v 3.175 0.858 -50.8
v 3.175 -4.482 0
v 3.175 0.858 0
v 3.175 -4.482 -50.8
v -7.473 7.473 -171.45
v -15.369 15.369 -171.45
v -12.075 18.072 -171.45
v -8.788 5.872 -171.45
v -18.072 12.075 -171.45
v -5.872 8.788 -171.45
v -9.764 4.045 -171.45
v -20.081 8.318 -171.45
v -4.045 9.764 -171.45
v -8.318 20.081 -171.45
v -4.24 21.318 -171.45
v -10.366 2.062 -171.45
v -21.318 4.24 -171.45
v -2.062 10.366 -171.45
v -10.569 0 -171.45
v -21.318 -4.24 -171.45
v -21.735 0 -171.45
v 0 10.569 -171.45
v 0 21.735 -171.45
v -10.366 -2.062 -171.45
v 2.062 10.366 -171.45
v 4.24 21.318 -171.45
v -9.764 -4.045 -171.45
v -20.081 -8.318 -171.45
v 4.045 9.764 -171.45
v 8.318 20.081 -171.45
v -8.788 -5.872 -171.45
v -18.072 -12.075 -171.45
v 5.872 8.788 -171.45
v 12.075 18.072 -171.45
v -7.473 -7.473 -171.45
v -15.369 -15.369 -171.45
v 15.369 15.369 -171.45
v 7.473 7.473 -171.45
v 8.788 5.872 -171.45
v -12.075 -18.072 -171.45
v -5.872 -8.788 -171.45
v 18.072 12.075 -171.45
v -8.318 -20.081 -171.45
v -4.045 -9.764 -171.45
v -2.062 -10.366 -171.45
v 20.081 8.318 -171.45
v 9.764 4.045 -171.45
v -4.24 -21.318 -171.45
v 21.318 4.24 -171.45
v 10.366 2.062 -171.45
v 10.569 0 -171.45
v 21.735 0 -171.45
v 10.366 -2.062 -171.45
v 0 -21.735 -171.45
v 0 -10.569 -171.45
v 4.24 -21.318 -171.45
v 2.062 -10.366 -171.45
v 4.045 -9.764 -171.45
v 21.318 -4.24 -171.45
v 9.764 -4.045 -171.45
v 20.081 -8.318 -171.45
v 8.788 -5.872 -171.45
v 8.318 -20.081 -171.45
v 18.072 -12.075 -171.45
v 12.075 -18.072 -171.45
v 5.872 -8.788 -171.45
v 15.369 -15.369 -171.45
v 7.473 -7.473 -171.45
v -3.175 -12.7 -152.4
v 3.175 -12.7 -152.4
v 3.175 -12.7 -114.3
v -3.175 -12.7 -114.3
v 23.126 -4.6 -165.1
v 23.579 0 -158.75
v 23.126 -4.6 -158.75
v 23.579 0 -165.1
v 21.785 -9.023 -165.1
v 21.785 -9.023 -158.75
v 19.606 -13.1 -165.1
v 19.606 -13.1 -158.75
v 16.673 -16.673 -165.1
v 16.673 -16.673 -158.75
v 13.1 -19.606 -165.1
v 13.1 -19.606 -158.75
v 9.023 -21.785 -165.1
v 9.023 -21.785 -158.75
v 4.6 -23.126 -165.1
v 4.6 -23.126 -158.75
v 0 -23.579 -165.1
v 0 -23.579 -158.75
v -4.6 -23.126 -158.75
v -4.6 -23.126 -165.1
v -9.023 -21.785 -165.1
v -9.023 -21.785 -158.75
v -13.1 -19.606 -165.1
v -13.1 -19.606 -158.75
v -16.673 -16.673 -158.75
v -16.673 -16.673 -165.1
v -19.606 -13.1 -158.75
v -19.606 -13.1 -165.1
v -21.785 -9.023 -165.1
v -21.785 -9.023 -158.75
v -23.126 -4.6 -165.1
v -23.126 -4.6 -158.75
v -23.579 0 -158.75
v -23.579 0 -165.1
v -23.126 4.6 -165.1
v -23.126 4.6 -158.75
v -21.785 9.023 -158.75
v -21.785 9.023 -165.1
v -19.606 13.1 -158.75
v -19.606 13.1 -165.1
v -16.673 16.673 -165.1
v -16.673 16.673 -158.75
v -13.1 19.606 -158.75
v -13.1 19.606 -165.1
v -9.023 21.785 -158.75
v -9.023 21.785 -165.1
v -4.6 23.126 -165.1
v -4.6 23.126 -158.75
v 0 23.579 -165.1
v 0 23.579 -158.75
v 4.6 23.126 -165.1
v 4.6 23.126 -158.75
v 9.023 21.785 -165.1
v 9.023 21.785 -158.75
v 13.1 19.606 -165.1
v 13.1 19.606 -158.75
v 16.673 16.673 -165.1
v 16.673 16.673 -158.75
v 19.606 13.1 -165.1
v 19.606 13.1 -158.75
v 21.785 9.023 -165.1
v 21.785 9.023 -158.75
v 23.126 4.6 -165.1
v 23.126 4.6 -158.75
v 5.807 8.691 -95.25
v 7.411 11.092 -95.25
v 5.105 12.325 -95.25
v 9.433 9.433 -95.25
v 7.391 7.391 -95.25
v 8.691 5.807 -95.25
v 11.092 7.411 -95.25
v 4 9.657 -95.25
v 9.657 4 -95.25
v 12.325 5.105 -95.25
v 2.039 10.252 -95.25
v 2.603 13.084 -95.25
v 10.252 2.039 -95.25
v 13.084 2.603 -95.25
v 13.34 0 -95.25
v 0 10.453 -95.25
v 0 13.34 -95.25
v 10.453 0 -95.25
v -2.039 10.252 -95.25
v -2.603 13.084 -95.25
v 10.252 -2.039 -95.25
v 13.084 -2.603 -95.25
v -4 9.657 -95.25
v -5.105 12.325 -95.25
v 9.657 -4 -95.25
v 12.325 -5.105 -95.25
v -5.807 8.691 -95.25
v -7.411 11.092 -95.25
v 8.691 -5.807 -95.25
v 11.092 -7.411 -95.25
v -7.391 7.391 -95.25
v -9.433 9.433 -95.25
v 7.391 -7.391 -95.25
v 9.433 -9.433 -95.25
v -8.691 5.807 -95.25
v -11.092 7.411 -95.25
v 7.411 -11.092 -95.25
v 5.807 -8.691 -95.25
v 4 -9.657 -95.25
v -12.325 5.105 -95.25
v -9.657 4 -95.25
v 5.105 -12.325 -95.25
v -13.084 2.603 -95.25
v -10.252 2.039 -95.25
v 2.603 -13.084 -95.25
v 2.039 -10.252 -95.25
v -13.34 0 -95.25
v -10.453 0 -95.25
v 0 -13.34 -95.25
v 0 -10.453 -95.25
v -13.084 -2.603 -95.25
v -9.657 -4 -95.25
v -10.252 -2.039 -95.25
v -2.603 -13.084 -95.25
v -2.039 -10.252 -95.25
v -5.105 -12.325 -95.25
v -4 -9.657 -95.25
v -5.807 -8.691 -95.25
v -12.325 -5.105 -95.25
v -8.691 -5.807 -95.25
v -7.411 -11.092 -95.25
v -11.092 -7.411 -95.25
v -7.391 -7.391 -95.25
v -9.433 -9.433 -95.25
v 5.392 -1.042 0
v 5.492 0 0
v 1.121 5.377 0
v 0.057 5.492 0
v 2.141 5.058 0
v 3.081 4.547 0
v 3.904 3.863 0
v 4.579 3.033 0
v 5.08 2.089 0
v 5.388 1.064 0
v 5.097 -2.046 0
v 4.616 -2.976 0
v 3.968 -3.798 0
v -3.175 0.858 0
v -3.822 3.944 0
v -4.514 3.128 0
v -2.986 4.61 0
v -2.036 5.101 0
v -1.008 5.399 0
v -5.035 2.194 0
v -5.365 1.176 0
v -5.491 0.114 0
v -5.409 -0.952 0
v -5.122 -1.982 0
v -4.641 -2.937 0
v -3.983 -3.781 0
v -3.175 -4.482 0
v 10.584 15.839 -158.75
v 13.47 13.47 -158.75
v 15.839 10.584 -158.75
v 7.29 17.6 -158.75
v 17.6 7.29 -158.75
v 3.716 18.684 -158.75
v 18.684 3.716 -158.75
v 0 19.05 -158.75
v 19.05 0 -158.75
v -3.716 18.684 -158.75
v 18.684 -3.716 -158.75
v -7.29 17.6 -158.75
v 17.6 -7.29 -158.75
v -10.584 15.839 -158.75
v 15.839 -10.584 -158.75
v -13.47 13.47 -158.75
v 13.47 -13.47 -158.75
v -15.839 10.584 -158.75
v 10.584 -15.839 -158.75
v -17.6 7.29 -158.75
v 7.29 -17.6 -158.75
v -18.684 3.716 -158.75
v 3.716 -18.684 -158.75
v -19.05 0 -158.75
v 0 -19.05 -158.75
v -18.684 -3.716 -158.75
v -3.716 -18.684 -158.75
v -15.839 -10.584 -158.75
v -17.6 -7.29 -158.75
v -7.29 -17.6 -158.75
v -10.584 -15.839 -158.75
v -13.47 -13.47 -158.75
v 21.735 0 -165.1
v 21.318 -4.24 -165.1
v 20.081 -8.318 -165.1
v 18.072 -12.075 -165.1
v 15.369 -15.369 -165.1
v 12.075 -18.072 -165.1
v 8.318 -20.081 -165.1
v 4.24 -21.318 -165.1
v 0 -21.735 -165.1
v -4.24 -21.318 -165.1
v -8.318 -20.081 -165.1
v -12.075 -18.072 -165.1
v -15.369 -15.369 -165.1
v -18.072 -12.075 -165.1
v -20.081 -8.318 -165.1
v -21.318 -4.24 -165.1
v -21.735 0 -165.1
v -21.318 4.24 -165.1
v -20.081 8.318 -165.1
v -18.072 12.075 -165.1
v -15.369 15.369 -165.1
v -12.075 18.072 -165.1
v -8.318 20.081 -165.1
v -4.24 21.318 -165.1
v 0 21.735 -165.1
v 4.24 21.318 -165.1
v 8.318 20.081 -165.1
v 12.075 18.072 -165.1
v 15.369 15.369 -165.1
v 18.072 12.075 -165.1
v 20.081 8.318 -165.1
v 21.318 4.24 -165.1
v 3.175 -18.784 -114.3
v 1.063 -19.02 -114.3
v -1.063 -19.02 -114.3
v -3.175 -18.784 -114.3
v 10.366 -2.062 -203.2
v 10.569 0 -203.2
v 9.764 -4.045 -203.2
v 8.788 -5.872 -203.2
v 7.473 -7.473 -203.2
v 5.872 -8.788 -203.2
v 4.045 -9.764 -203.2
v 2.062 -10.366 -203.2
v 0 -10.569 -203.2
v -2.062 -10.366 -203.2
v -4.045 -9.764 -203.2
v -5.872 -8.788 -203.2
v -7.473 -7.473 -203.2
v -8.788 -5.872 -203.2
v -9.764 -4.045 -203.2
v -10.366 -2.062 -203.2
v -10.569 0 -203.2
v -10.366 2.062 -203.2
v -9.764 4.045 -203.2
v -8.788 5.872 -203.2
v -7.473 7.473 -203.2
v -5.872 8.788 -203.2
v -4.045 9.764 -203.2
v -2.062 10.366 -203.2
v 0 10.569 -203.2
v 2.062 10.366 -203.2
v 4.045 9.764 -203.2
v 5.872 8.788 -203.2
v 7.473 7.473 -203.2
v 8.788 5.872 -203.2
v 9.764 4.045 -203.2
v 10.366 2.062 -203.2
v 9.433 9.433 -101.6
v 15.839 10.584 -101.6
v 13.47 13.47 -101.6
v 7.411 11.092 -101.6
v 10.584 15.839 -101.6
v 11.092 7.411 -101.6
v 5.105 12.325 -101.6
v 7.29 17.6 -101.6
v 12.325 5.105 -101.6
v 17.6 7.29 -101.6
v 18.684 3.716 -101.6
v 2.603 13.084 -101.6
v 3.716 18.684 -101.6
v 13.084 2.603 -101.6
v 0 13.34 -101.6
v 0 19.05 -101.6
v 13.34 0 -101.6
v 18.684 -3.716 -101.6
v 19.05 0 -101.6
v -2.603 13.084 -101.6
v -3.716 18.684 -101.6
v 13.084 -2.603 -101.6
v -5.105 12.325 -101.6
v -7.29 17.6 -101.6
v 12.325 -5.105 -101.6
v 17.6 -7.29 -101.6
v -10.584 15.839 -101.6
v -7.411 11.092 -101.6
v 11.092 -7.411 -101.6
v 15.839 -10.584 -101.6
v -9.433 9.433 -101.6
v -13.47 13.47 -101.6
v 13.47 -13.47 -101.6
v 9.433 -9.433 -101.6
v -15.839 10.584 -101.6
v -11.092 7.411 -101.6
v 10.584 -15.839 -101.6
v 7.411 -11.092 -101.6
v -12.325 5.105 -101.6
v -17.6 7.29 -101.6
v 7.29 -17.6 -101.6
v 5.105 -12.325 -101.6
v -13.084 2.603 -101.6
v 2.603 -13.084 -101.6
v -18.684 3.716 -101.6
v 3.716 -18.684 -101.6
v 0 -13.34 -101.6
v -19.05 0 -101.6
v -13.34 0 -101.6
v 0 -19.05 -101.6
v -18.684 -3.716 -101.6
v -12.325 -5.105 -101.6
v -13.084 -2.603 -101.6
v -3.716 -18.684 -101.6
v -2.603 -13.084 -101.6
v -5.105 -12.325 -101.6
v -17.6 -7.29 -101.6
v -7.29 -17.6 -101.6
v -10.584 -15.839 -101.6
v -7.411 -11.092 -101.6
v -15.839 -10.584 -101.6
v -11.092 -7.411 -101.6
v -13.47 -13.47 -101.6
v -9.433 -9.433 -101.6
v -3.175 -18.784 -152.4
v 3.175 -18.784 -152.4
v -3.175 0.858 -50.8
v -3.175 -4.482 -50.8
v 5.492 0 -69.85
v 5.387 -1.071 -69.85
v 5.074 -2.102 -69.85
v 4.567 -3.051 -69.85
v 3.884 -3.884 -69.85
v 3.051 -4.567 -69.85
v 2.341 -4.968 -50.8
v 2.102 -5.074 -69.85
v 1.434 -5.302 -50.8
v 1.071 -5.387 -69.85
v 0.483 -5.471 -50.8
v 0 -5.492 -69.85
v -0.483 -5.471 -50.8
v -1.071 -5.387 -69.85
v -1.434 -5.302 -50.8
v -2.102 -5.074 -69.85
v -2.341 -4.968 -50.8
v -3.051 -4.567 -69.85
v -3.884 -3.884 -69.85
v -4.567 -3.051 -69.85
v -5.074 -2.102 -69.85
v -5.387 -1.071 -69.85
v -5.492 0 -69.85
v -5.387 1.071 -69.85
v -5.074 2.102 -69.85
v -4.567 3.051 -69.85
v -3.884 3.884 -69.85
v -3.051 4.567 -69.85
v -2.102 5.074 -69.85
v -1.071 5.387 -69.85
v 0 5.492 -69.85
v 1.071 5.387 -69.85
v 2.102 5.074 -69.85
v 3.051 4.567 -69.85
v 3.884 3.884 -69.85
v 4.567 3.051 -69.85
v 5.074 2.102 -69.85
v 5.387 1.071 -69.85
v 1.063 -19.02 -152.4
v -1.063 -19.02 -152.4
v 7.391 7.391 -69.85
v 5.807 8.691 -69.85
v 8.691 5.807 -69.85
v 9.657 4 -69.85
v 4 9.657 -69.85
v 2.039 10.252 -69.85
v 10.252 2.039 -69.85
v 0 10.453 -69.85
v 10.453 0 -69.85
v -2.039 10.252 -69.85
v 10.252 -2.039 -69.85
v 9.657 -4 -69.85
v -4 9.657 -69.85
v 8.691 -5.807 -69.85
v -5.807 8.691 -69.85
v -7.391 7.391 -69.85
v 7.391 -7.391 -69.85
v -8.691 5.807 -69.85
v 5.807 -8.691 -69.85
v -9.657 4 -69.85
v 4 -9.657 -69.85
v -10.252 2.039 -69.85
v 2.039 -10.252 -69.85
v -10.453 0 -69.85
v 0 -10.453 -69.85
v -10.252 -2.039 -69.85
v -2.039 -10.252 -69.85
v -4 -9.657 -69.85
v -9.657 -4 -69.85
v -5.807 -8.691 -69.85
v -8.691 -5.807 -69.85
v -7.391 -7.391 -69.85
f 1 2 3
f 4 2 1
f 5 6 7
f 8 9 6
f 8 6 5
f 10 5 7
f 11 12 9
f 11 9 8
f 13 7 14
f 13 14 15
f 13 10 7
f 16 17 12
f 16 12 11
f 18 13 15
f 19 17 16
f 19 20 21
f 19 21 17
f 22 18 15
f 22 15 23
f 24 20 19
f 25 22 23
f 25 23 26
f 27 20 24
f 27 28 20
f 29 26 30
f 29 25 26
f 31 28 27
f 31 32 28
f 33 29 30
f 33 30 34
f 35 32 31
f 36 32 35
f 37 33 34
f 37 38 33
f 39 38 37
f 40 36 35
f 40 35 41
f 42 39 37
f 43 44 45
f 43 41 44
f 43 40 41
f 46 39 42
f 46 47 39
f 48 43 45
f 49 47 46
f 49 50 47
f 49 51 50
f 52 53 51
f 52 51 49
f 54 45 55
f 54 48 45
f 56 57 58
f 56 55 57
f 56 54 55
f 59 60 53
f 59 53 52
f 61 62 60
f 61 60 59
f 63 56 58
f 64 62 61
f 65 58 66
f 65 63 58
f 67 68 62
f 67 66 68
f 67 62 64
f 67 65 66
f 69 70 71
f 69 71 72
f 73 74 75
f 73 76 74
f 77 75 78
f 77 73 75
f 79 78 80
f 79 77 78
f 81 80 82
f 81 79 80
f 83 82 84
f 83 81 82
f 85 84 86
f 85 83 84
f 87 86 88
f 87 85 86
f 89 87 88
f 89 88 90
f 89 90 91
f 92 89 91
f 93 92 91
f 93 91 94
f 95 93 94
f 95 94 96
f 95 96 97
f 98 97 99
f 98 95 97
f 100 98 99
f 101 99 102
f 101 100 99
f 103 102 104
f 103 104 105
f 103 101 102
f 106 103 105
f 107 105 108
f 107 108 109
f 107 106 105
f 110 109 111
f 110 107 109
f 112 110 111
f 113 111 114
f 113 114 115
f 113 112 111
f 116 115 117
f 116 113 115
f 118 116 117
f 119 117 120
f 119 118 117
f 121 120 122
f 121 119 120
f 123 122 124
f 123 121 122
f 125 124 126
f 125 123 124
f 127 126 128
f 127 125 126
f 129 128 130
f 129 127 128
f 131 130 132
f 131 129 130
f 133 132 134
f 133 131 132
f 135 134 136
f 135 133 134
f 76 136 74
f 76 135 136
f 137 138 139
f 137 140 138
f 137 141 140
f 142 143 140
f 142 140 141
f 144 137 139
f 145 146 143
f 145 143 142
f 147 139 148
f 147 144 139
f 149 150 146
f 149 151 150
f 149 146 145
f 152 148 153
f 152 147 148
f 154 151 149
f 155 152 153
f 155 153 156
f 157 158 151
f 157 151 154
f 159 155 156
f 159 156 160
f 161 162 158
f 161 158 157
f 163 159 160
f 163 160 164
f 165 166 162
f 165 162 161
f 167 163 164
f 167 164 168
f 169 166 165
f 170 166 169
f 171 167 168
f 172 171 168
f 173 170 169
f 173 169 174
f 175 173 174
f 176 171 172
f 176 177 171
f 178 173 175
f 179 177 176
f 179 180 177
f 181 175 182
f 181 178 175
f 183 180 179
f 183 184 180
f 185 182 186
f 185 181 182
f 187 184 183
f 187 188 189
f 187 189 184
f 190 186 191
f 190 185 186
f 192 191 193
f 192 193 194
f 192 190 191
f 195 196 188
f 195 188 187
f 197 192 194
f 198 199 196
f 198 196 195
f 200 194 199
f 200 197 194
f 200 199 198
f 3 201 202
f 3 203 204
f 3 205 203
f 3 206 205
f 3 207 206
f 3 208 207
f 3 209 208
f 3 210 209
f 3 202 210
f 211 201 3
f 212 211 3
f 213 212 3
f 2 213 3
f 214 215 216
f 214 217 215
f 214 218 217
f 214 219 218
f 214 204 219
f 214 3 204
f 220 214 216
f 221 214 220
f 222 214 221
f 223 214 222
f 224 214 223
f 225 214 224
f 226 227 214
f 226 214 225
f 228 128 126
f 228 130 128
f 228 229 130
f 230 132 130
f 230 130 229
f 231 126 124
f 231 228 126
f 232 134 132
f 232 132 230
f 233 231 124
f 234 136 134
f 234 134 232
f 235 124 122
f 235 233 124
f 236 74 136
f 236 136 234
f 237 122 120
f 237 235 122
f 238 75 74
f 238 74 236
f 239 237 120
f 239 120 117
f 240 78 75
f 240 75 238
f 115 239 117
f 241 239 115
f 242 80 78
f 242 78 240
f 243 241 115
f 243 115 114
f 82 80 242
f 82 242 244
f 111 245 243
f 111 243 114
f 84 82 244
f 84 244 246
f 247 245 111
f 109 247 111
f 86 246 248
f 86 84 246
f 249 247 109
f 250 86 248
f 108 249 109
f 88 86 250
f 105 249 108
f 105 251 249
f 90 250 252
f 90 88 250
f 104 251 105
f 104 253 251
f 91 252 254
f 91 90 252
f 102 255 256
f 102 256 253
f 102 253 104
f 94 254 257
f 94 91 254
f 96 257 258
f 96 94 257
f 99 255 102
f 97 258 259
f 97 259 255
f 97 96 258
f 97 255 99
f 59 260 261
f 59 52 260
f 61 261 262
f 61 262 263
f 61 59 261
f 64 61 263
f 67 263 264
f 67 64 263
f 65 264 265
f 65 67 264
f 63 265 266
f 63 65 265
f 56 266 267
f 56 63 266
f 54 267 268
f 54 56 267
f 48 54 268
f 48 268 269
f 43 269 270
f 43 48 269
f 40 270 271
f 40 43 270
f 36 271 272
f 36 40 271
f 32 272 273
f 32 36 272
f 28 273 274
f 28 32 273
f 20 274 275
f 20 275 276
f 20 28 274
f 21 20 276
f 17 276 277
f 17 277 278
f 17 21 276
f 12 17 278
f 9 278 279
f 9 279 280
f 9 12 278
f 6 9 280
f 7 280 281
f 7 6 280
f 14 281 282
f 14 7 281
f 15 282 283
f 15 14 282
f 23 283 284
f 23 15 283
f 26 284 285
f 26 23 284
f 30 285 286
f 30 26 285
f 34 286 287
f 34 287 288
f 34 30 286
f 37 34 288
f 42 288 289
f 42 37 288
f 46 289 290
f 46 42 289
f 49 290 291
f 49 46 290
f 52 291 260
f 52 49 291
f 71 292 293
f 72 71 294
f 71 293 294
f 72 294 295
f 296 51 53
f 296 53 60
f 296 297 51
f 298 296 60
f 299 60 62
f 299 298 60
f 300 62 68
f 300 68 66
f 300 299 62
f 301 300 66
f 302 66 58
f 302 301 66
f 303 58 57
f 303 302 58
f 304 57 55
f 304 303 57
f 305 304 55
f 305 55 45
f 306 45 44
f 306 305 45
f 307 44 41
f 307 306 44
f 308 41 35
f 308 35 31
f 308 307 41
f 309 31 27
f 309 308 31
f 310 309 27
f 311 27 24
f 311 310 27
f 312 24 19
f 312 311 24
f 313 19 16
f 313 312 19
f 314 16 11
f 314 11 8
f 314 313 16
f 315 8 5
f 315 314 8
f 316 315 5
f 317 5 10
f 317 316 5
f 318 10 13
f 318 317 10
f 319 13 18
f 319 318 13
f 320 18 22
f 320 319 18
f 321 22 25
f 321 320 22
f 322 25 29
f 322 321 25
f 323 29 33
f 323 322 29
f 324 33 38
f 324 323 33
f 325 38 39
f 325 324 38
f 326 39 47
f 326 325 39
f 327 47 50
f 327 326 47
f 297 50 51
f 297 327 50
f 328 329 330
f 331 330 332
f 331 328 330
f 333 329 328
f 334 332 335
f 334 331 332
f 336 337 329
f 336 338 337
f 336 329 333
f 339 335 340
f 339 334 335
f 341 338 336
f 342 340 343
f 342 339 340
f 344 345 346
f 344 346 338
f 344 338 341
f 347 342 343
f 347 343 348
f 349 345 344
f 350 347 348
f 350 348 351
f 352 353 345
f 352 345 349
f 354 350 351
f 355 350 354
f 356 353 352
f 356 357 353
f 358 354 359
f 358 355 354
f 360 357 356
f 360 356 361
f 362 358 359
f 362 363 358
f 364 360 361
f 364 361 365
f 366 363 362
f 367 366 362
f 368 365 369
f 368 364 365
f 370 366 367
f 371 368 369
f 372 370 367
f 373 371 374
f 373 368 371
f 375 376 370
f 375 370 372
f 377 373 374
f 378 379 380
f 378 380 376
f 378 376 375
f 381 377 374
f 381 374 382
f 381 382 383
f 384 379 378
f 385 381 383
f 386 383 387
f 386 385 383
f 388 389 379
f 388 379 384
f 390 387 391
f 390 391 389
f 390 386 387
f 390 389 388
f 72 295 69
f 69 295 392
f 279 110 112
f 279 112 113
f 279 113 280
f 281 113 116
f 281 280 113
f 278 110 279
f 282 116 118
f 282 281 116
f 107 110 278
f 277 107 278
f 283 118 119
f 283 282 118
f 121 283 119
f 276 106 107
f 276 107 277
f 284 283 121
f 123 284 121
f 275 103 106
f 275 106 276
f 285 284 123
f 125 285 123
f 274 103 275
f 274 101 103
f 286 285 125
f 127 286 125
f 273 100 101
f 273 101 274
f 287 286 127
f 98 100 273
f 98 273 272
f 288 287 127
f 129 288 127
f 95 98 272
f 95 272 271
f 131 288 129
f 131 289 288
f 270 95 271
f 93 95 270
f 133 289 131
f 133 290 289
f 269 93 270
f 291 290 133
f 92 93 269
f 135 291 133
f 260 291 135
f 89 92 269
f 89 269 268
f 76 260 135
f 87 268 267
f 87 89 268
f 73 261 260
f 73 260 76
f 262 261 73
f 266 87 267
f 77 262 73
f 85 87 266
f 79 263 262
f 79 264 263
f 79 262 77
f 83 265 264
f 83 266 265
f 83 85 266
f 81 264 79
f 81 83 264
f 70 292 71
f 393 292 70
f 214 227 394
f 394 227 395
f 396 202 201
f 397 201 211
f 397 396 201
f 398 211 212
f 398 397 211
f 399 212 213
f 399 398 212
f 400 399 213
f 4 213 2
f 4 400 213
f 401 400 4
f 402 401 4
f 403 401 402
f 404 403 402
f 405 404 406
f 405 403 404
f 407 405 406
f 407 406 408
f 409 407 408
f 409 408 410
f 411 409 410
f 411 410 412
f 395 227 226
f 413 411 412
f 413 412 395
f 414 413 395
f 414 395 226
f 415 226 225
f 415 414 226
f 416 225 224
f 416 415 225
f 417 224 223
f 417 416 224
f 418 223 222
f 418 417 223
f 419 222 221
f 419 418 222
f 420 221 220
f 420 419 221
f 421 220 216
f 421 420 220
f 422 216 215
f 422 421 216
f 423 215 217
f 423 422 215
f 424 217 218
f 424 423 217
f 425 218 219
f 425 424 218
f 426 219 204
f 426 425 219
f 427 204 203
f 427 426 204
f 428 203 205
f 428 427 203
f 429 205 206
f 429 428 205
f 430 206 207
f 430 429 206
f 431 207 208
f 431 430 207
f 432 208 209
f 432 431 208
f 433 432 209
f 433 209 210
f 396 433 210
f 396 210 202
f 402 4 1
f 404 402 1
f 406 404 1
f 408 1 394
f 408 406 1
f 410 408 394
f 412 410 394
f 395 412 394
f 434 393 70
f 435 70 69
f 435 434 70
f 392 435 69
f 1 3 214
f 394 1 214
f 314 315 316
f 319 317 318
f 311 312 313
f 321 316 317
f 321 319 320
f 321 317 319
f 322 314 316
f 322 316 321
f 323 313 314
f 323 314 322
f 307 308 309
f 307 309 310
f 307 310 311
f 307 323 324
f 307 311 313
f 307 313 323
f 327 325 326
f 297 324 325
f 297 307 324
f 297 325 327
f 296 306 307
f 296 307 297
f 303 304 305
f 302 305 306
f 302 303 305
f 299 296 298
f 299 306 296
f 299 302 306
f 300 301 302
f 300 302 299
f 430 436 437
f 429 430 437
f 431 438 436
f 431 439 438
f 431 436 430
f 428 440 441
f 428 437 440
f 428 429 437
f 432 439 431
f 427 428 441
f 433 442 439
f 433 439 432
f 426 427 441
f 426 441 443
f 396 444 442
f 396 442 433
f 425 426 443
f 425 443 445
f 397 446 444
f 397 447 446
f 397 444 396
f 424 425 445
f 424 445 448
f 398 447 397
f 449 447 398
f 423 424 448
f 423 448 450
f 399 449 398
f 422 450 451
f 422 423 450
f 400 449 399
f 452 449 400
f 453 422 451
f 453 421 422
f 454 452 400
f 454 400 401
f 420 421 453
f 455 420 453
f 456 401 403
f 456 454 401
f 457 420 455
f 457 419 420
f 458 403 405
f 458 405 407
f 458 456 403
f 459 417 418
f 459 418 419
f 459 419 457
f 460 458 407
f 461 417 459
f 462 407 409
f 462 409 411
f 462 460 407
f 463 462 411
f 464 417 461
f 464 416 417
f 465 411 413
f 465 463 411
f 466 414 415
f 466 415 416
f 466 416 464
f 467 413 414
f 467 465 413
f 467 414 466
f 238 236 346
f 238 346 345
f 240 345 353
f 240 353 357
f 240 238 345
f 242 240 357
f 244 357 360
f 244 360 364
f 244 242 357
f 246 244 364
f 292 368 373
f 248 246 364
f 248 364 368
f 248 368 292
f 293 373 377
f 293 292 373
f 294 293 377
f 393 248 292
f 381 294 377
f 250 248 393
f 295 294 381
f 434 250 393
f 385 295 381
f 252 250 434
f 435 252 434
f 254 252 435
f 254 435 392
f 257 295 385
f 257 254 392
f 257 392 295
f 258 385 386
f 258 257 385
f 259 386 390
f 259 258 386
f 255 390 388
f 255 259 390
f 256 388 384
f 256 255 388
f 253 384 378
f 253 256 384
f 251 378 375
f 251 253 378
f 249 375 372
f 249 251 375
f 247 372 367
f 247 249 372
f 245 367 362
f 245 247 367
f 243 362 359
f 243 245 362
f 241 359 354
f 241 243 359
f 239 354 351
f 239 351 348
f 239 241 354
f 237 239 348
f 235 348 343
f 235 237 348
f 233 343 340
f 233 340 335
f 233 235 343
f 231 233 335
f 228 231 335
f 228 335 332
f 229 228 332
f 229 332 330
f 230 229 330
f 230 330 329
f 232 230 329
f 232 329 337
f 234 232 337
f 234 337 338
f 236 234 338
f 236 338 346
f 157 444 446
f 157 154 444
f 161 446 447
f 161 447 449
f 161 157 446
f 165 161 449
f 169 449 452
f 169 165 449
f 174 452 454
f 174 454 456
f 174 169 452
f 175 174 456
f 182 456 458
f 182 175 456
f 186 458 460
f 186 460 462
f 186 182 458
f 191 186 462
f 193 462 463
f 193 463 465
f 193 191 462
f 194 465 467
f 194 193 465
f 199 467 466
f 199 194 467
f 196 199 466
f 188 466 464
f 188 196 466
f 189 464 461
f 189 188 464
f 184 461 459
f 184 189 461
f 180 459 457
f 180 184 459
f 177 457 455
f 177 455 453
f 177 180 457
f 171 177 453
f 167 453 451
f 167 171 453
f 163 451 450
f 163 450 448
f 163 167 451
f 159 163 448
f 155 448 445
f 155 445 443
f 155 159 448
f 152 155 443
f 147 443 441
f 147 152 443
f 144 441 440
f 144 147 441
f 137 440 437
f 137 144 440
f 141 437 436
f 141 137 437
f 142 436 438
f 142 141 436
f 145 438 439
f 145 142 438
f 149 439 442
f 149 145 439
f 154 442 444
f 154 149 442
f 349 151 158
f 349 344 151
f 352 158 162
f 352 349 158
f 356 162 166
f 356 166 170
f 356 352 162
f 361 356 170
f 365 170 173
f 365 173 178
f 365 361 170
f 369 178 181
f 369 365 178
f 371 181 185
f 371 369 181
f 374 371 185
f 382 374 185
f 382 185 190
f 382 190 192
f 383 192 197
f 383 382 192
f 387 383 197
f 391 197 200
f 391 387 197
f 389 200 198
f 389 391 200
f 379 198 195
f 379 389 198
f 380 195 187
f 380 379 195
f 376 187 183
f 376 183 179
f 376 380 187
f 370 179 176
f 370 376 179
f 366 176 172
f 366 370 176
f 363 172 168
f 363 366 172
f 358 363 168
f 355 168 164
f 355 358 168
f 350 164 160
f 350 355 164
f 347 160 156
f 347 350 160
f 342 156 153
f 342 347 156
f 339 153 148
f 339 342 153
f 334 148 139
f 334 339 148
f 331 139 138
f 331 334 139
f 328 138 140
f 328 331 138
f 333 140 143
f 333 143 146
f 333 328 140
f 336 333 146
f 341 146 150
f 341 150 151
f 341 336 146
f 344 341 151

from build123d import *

# Parameters (mm, degrees)
SKETCH2_W          = 6.35
SKETCH2_H          = 50.8
CUT_EXTRUDE1_DEPTH = 6.35
SKETCH3_W          = 6.35
SKETCH3_H          = 38.1
CUT_EXTRUDE2_DEPTH = 6.35


with BuildPart() as part:
    # Sketch1 → Revolve1 (revolve)
    with BuildSketch(Plane(origin=(0, 0, 0), x_dir=(0, 0, -1), z_dir=(1, 0, 0)), mode=Mode.PRIVATE) as revolve1_sk:
        Polygon((0, 0), (0, 5.492242), (69.85, 5.492242), (69.85, 10.4529763), (95.25, 10.4529763), (95.25, 13.340207), (101.6, 13.340207), (101.6, 19.05), (158.75, 19.05), (158.75, 23.579455), (165.1, 23.579455), (165.1, 21.735161), (171.45, 21.735161), (171.45, 10.5689654), (203.2, 10.5689654), (203.2, 0), align=None)
    revolve(revolve1_sk.sketch.rotate(Axis((0, 0, 0), (0, 0, -1)), 90), axis=Axis((0, 0, 0), (0, 0, -1)))

    # Sketch2 → Cut-Extrude1 (cut)
    with BuildSketch(Plane(origin=(0, -5.492242, 0), x_dir=(-1, 0, 0), z_dir=(0, -1, 0))):
        with Locations((0, 25.4)):
            Rectangle(SKETCH2_W, SKETCH2_H)
    extrude(amount=-CUT_EXTRUDE1_DEPTH, mode=Mode.SUBTRACT)

    # Sketch3 → Cut-Extrude2 (cut)
    with BuildSketch(Plane(origin=(0, -19.05, 0), x_dir=(-1, 0, 0), z_dir=(0, -1, 0))):
        with Locations((0, 133.35)):
            Rectangle(SKETCH3_W, SKETCH3_H)
    extrude(amount=-CUT_EXTRUDE2_DEPTH, mode=Mode.SUBTRACT)


solid = part.part
